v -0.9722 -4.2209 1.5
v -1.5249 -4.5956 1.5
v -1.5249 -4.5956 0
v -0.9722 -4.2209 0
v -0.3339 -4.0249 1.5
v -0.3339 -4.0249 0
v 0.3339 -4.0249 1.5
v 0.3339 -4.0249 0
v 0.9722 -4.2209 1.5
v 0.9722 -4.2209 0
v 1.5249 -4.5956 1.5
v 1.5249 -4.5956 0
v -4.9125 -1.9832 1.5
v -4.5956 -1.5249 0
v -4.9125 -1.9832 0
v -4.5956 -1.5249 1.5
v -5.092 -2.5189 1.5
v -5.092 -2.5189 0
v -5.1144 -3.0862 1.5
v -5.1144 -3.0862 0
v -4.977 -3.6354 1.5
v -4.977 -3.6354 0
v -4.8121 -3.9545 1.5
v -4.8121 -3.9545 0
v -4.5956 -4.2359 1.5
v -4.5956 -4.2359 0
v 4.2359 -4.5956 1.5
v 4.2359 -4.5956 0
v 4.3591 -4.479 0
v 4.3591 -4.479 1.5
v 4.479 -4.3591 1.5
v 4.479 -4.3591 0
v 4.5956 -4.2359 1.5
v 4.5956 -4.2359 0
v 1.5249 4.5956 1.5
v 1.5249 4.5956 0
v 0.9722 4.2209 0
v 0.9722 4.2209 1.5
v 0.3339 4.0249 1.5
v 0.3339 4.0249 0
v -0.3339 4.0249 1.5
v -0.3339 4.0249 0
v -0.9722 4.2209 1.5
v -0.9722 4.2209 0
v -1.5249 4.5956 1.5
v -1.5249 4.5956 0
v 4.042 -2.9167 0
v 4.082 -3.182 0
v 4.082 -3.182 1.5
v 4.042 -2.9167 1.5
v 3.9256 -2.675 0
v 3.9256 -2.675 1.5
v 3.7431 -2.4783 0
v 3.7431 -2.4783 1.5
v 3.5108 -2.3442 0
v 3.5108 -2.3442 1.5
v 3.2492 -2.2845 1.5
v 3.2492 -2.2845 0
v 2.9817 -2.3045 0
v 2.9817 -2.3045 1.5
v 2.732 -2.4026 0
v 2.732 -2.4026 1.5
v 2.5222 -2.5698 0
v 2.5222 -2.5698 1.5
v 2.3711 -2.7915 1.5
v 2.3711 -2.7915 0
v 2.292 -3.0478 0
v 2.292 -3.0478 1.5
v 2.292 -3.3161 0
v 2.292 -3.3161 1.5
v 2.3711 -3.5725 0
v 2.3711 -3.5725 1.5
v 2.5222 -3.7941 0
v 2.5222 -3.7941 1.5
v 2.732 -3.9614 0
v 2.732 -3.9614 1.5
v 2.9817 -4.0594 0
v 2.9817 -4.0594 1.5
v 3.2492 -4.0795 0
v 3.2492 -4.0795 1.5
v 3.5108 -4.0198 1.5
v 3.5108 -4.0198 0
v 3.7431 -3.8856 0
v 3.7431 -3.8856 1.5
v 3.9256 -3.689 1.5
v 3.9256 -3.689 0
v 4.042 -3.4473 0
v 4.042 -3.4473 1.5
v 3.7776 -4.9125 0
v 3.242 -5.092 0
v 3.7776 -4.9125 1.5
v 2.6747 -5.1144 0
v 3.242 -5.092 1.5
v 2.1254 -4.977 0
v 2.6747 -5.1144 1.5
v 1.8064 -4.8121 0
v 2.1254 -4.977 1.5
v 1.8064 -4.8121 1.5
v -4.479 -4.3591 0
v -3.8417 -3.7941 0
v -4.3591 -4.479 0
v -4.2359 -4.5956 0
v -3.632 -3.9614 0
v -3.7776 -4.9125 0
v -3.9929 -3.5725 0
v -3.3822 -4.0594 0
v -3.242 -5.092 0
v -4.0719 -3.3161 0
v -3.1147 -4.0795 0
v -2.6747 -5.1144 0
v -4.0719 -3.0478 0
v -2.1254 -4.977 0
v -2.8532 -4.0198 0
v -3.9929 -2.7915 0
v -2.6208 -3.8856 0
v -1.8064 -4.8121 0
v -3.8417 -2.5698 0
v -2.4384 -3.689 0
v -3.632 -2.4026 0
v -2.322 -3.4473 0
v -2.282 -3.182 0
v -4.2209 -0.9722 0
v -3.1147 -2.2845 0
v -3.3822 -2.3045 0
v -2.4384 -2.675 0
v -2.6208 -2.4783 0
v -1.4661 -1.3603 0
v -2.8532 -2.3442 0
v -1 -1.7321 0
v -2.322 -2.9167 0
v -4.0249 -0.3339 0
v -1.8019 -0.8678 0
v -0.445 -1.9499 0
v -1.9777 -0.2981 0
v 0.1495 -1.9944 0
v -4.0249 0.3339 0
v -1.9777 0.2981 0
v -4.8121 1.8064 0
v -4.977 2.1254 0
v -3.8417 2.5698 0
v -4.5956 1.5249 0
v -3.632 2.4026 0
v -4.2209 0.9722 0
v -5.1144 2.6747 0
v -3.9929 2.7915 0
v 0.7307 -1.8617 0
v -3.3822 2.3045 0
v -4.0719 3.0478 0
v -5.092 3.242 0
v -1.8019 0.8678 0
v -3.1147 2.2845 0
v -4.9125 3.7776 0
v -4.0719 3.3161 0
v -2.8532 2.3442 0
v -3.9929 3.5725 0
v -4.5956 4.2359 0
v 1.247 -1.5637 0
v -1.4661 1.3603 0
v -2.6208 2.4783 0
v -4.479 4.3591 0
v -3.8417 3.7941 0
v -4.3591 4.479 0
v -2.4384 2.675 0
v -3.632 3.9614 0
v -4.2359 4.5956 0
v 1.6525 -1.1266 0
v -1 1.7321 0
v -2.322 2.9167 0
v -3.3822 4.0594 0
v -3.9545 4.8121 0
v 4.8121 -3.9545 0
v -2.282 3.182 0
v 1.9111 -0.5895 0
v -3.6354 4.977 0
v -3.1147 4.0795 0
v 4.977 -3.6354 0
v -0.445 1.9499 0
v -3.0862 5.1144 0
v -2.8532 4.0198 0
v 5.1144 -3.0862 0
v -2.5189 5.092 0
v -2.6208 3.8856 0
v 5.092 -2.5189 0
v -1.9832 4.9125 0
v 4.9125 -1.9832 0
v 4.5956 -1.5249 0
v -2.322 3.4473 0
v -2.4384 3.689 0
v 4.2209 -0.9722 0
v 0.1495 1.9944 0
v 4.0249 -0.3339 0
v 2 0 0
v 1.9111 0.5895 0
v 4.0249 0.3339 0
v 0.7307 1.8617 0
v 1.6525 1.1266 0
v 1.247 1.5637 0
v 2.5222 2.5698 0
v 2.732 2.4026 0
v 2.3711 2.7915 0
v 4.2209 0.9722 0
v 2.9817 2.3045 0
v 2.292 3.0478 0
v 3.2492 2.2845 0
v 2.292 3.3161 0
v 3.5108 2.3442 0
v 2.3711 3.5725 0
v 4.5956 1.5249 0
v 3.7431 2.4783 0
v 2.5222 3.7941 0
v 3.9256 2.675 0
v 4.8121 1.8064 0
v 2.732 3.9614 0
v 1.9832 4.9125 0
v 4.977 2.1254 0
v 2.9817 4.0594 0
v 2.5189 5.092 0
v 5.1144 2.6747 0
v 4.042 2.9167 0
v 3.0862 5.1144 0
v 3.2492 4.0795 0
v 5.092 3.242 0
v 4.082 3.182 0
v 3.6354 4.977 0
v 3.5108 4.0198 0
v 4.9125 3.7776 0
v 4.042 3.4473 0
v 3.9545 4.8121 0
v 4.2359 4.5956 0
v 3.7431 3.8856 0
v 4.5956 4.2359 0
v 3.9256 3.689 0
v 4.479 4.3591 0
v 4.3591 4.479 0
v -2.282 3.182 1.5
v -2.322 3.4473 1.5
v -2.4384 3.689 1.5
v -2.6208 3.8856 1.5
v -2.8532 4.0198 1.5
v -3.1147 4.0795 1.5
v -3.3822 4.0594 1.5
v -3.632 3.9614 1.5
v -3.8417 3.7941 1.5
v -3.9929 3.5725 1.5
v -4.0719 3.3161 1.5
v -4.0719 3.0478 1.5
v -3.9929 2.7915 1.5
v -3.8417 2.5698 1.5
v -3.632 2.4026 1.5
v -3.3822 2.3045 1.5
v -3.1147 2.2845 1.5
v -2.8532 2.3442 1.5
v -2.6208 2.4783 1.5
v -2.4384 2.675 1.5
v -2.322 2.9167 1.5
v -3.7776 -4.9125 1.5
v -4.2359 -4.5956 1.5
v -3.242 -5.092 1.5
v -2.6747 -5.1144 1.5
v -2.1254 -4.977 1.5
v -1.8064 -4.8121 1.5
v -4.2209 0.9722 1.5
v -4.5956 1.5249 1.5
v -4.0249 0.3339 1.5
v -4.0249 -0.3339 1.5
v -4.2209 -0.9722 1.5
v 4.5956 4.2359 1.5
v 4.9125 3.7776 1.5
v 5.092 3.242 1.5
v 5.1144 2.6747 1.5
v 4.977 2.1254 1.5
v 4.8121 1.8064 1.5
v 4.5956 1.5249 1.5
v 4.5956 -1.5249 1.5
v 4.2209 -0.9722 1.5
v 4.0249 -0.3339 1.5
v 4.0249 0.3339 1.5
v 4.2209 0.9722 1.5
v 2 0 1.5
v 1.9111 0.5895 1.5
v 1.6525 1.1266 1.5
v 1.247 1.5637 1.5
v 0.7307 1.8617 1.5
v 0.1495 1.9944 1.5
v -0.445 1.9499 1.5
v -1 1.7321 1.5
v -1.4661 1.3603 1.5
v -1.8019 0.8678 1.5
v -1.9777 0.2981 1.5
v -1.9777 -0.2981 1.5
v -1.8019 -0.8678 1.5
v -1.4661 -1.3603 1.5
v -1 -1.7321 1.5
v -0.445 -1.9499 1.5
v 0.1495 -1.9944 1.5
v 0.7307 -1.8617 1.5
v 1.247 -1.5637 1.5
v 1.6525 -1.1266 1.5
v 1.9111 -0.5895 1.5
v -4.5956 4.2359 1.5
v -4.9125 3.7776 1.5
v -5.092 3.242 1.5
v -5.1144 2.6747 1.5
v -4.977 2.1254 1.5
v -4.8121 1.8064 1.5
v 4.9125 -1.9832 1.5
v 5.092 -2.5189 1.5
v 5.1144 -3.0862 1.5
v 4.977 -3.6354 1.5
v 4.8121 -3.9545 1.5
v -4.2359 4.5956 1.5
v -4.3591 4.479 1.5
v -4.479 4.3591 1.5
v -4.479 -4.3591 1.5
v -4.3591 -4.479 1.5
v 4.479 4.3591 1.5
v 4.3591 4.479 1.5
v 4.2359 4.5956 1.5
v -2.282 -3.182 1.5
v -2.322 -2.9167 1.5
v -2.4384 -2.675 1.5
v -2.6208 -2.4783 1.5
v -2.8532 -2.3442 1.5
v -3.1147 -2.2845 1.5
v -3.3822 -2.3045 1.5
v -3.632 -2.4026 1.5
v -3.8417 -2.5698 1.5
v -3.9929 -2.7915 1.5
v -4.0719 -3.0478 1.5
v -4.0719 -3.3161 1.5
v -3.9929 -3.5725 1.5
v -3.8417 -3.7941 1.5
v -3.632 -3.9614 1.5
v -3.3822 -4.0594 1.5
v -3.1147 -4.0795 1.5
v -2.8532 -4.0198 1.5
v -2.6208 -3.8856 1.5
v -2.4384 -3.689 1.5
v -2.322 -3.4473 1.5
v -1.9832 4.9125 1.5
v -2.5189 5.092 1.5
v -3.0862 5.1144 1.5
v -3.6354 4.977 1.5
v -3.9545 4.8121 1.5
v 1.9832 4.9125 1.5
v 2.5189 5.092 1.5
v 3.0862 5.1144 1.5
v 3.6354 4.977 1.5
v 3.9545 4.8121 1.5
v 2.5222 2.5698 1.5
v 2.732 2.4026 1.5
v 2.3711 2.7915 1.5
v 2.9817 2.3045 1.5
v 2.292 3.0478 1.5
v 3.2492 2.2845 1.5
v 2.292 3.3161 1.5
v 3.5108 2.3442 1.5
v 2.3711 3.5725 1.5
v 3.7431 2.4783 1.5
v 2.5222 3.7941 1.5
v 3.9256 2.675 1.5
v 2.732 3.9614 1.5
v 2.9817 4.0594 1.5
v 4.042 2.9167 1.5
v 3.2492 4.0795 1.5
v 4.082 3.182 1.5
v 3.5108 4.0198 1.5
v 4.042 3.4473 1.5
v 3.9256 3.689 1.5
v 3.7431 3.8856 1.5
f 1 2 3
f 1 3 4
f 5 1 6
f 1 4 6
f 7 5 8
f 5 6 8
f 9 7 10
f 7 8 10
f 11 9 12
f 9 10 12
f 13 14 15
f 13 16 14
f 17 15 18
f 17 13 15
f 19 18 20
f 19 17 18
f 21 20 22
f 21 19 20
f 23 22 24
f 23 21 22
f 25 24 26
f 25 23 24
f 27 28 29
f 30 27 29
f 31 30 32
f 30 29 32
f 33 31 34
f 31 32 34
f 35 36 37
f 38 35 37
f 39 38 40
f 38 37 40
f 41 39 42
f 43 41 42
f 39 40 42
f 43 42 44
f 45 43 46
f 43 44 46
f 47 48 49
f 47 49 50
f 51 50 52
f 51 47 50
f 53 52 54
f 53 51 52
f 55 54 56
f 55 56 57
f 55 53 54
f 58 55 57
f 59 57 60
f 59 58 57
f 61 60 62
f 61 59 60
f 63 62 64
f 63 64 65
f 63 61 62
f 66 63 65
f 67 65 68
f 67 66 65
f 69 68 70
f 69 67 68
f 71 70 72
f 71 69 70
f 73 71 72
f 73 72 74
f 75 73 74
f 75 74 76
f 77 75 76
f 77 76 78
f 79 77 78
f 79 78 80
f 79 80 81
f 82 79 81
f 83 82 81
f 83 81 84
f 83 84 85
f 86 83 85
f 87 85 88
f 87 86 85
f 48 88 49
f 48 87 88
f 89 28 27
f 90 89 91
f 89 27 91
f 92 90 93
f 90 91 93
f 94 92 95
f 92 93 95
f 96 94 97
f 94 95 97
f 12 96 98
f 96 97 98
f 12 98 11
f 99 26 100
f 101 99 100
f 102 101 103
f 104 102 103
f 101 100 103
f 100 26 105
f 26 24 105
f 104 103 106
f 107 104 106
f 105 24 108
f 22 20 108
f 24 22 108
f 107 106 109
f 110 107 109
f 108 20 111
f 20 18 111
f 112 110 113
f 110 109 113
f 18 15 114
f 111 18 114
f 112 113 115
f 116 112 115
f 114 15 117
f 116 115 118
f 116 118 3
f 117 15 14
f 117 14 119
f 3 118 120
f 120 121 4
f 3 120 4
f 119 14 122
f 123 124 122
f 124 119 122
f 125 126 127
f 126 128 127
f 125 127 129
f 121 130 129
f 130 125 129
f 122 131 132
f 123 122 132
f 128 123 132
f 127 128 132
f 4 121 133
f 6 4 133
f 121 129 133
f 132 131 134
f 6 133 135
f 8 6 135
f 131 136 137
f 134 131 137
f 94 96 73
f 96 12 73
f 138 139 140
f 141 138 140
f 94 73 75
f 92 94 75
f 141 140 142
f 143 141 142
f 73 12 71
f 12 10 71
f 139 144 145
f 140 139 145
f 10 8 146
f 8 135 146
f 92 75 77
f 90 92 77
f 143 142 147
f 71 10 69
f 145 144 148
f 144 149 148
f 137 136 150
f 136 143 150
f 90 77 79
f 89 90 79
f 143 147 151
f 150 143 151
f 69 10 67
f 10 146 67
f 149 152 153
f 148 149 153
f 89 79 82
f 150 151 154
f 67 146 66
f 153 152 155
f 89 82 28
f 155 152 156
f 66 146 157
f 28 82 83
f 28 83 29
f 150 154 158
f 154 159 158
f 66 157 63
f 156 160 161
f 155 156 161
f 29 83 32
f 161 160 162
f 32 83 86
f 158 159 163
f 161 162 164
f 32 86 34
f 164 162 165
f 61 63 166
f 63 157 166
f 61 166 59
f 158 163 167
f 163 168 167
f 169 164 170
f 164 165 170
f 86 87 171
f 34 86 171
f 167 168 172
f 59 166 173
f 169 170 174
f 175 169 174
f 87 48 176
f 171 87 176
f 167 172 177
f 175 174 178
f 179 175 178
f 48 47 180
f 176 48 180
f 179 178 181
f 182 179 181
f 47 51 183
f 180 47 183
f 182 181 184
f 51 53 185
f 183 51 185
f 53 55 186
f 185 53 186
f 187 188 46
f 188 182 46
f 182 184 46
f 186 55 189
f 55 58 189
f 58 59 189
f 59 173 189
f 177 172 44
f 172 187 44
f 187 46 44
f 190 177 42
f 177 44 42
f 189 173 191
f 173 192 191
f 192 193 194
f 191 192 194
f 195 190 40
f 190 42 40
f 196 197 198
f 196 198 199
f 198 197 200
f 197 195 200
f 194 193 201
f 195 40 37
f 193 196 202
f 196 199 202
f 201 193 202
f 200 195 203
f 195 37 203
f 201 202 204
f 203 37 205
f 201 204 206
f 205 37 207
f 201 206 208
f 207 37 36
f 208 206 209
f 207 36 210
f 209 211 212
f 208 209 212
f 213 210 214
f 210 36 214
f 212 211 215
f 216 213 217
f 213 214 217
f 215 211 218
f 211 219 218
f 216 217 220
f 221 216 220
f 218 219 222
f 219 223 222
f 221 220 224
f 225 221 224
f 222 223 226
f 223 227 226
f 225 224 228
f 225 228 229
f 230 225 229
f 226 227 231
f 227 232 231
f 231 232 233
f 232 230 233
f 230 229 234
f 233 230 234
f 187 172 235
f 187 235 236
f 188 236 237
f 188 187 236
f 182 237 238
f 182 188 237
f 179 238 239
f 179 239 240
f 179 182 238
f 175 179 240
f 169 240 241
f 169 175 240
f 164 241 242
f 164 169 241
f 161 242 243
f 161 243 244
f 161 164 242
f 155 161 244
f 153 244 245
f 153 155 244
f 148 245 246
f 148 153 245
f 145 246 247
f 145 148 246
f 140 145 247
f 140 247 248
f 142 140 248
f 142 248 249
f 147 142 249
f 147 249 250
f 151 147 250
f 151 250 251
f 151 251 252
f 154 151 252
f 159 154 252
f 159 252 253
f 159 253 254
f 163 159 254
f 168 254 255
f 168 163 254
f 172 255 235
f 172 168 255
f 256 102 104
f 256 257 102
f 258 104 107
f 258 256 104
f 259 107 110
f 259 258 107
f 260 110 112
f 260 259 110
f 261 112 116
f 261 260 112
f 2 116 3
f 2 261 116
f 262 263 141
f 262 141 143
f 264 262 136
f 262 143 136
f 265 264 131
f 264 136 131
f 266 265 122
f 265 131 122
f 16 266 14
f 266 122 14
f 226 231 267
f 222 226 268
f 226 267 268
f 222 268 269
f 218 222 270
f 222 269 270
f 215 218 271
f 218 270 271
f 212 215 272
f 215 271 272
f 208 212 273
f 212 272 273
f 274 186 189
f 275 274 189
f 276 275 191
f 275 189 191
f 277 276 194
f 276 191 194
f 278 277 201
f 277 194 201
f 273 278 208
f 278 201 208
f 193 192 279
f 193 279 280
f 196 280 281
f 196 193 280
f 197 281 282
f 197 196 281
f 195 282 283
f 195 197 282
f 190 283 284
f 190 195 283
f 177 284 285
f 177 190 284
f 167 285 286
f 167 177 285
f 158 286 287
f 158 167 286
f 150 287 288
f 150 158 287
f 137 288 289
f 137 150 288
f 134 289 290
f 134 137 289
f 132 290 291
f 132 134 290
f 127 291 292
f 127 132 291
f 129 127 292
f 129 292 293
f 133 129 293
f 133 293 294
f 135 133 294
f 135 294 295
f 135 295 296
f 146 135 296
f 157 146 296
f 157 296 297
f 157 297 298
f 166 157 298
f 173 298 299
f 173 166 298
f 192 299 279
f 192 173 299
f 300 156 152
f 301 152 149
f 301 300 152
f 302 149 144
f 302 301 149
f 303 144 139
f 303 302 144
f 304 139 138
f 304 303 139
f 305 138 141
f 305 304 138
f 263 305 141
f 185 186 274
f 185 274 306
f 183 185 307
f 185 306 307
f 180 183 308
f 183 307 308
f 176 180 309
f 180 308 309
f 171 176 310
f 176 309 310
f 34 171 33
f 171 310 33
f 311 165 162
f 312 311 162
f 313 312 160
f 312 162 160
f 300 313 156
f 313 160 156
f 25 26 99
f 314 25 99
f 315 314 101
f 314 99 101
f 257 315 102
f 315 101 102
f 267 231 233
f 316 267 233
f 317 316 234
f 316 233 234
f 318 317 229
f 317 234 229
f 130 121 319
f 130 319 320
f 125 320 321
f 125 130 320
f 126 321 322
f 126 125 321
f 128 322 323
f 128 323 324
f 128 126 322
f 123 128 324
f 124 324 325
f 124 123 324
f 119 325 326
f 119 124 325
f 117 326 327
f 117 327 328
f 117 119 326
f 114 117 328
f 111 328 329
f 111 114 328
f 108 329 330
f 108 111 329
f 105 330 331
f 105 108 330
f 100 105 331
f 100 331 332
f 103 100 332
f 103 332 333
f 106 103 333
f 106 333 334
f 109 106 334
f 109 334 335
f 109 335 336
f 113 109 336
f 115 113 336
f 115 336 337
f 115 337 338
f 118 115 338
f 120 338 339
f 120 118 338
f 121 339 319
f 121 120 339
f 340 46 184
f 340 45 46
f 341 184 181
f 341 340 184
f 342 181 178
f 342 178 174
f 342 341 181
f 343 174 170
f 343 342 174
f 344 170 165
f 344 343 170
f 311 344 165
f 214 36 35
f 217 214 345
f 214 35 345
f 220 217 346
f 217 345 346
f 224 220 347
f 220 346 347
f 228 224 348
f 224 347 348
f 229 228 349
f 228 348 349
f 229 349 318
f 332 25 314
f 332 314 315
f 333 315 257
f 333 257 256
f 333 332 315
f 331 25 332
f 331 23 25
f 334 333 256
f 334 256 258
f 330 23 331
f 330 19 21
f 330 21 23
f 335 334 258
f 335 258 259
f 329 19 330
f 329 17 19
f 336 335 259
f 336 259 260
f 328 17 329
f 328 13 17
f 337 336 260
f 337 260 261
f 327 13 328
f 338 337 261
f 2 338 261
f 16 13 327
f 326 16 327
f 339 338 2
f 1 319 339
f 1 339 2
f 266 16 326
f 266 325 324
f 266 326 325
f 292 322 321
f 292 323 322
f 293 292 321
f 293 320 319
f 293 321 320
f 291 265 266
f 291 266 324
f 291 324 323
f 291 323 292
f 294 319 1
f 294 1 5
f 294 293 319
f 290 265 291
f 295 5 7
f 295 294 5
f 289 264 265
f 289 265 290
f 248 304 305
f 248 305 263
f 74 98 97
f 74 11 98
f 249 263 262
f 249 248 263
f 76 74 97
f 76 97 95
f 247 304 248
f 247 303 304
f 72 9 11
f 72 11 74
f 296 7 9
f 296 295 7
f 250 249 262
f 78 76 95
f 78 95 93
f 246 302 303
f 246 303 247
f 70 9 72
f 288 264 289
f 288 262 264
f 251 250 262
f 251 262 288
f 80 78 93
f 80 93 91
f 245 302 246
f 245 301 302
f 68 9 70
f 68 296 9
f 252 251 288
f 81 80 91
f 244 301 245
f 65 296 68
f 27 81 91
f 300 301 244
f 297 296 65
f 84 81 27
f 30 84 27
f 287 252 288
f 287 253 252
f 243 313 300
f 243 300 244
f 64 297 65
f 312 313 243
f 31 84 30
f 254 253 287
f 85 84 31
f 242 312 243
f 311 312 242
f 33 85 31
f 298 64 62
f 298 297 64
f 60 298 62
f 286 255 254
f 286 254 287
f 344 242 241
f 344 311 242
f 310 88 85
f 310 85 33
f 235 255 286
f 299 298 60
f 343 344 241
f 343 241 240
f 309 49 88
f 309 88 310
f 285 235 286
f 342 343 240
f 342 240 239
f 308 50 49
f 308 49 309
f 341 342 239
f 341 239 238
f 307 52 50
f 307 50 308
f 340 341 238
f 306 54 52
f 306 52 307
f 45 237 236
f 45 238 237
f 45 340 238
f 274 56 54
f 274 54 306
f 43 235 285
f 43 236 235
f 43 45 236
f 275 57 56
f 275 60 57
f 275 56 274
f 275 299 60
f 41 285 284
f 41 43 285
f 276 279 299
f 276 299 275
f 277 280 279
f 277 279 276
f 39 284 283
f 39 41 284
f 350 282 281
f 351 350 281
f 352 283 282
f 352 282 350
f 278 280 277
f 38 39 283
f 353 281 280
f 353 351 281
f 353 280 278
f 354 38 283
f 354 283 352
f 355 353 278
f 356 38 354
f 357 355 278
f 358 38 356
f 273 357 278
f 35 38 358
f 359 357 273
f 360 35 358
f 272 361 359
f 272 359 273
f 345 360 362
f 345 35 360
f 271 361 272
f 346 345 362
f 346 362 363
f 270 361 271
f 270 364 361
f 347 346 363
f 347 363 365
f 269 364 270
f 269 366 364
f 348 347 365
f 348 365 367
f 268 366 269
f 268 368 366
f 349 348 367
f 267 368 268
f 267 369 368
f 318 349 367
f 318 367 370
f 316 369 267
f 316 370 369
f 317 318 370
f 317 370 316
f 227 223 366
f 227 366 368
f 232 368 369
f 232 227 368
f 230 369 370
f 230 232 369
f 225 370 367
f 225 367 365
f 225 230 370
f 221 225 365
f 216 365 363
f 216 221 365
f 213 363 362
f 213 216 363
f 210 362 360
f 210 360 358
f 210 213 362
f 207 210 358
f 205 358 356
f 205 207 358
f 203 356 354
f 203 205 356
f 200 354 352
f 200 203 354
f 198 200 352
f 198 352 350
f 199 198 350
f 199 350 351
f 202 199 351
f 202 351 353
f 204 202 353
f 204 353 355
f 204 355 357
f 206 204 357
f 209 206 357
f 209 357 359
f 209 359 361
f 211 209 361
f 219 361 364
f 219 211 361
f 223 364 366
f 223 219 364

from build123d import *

# Parameters (mm, degrees)
F0_R     = 0.9
F0_R_2   = 2
F1_DEPTH = 1.5
F2_R     = 2


with BuildPart() as f1:
    # F0 (on Top) → F1 (new body)
    with BuildSketch(Plane.XY):
        with BuildLine():
            ThreePointArc((2.21325, 5.845), (0, 4), (-2.21325, 5.845))
            ThreePointArc((-2.21325, 5.845), (-4.419417, 4.419417), (-5.845, 2.21325))
            ThreePointArc((-5.845, 2.21325), (-4, 0), (-5.845, -2.21325))
            ThreePointArc((-5.845, -2.21325), (-4.419417, -4.419417), (-2.21325, -5.845))
            ThreePointArc((-2.21325, -5.845), (0, -4), (2.21325, -5.845))
            ThreePointArc((2.21325, -5.845), (4.419417, -4.419417), (5.845, -2.21325))
            ThreePointArc((5.845, -2.21325), (4, 0), (5.845, 2.21325))
            ThreePointArc((5.845, 2.21325), (4.419417, 4.419417), (2.21325, 5.845))
        make_face()
        with Locations((-3.181981, -3.181981)):
            Circle(F0_R, mode=Mode.SUBTRACT)
        with Locations((3.181981, -3.181981)):
            Circle(F0_R, mode=Mode.SUBTRACT)
        Circle(F0_R_2, mode=Mode.SUBTRACT)
        with Locations((-3.181981, 3.181981)):
            Circle(F0_R, mode=Mode.SUBTRACT)
        with Locations((3.181981, 3.181981)):
            Circle(F0_R, mode=Mode.SUBTRACT)
    extrude(amount=F1_DEPTH)

    # F2
    f2_edges = [f1.edges().sort_by_distance(p)[0] for p in [
        (2.21325, -5.845, 0.75),
        (-2.21325, -5.845, 0.75),
        (5.845, -2.21325, 0.75),
        (5.845, 2.21325, 0.75),
        (-5.845, -2.21325, 0.75),
        (-2.21325, 5.845, 0.75),
        (2.21325, 5.845, 0.75),
        (-5.845, 2.21325, 0.75),
    ]]
    fillet(f2_edges, radius=F2_R)


solid = f1.part
